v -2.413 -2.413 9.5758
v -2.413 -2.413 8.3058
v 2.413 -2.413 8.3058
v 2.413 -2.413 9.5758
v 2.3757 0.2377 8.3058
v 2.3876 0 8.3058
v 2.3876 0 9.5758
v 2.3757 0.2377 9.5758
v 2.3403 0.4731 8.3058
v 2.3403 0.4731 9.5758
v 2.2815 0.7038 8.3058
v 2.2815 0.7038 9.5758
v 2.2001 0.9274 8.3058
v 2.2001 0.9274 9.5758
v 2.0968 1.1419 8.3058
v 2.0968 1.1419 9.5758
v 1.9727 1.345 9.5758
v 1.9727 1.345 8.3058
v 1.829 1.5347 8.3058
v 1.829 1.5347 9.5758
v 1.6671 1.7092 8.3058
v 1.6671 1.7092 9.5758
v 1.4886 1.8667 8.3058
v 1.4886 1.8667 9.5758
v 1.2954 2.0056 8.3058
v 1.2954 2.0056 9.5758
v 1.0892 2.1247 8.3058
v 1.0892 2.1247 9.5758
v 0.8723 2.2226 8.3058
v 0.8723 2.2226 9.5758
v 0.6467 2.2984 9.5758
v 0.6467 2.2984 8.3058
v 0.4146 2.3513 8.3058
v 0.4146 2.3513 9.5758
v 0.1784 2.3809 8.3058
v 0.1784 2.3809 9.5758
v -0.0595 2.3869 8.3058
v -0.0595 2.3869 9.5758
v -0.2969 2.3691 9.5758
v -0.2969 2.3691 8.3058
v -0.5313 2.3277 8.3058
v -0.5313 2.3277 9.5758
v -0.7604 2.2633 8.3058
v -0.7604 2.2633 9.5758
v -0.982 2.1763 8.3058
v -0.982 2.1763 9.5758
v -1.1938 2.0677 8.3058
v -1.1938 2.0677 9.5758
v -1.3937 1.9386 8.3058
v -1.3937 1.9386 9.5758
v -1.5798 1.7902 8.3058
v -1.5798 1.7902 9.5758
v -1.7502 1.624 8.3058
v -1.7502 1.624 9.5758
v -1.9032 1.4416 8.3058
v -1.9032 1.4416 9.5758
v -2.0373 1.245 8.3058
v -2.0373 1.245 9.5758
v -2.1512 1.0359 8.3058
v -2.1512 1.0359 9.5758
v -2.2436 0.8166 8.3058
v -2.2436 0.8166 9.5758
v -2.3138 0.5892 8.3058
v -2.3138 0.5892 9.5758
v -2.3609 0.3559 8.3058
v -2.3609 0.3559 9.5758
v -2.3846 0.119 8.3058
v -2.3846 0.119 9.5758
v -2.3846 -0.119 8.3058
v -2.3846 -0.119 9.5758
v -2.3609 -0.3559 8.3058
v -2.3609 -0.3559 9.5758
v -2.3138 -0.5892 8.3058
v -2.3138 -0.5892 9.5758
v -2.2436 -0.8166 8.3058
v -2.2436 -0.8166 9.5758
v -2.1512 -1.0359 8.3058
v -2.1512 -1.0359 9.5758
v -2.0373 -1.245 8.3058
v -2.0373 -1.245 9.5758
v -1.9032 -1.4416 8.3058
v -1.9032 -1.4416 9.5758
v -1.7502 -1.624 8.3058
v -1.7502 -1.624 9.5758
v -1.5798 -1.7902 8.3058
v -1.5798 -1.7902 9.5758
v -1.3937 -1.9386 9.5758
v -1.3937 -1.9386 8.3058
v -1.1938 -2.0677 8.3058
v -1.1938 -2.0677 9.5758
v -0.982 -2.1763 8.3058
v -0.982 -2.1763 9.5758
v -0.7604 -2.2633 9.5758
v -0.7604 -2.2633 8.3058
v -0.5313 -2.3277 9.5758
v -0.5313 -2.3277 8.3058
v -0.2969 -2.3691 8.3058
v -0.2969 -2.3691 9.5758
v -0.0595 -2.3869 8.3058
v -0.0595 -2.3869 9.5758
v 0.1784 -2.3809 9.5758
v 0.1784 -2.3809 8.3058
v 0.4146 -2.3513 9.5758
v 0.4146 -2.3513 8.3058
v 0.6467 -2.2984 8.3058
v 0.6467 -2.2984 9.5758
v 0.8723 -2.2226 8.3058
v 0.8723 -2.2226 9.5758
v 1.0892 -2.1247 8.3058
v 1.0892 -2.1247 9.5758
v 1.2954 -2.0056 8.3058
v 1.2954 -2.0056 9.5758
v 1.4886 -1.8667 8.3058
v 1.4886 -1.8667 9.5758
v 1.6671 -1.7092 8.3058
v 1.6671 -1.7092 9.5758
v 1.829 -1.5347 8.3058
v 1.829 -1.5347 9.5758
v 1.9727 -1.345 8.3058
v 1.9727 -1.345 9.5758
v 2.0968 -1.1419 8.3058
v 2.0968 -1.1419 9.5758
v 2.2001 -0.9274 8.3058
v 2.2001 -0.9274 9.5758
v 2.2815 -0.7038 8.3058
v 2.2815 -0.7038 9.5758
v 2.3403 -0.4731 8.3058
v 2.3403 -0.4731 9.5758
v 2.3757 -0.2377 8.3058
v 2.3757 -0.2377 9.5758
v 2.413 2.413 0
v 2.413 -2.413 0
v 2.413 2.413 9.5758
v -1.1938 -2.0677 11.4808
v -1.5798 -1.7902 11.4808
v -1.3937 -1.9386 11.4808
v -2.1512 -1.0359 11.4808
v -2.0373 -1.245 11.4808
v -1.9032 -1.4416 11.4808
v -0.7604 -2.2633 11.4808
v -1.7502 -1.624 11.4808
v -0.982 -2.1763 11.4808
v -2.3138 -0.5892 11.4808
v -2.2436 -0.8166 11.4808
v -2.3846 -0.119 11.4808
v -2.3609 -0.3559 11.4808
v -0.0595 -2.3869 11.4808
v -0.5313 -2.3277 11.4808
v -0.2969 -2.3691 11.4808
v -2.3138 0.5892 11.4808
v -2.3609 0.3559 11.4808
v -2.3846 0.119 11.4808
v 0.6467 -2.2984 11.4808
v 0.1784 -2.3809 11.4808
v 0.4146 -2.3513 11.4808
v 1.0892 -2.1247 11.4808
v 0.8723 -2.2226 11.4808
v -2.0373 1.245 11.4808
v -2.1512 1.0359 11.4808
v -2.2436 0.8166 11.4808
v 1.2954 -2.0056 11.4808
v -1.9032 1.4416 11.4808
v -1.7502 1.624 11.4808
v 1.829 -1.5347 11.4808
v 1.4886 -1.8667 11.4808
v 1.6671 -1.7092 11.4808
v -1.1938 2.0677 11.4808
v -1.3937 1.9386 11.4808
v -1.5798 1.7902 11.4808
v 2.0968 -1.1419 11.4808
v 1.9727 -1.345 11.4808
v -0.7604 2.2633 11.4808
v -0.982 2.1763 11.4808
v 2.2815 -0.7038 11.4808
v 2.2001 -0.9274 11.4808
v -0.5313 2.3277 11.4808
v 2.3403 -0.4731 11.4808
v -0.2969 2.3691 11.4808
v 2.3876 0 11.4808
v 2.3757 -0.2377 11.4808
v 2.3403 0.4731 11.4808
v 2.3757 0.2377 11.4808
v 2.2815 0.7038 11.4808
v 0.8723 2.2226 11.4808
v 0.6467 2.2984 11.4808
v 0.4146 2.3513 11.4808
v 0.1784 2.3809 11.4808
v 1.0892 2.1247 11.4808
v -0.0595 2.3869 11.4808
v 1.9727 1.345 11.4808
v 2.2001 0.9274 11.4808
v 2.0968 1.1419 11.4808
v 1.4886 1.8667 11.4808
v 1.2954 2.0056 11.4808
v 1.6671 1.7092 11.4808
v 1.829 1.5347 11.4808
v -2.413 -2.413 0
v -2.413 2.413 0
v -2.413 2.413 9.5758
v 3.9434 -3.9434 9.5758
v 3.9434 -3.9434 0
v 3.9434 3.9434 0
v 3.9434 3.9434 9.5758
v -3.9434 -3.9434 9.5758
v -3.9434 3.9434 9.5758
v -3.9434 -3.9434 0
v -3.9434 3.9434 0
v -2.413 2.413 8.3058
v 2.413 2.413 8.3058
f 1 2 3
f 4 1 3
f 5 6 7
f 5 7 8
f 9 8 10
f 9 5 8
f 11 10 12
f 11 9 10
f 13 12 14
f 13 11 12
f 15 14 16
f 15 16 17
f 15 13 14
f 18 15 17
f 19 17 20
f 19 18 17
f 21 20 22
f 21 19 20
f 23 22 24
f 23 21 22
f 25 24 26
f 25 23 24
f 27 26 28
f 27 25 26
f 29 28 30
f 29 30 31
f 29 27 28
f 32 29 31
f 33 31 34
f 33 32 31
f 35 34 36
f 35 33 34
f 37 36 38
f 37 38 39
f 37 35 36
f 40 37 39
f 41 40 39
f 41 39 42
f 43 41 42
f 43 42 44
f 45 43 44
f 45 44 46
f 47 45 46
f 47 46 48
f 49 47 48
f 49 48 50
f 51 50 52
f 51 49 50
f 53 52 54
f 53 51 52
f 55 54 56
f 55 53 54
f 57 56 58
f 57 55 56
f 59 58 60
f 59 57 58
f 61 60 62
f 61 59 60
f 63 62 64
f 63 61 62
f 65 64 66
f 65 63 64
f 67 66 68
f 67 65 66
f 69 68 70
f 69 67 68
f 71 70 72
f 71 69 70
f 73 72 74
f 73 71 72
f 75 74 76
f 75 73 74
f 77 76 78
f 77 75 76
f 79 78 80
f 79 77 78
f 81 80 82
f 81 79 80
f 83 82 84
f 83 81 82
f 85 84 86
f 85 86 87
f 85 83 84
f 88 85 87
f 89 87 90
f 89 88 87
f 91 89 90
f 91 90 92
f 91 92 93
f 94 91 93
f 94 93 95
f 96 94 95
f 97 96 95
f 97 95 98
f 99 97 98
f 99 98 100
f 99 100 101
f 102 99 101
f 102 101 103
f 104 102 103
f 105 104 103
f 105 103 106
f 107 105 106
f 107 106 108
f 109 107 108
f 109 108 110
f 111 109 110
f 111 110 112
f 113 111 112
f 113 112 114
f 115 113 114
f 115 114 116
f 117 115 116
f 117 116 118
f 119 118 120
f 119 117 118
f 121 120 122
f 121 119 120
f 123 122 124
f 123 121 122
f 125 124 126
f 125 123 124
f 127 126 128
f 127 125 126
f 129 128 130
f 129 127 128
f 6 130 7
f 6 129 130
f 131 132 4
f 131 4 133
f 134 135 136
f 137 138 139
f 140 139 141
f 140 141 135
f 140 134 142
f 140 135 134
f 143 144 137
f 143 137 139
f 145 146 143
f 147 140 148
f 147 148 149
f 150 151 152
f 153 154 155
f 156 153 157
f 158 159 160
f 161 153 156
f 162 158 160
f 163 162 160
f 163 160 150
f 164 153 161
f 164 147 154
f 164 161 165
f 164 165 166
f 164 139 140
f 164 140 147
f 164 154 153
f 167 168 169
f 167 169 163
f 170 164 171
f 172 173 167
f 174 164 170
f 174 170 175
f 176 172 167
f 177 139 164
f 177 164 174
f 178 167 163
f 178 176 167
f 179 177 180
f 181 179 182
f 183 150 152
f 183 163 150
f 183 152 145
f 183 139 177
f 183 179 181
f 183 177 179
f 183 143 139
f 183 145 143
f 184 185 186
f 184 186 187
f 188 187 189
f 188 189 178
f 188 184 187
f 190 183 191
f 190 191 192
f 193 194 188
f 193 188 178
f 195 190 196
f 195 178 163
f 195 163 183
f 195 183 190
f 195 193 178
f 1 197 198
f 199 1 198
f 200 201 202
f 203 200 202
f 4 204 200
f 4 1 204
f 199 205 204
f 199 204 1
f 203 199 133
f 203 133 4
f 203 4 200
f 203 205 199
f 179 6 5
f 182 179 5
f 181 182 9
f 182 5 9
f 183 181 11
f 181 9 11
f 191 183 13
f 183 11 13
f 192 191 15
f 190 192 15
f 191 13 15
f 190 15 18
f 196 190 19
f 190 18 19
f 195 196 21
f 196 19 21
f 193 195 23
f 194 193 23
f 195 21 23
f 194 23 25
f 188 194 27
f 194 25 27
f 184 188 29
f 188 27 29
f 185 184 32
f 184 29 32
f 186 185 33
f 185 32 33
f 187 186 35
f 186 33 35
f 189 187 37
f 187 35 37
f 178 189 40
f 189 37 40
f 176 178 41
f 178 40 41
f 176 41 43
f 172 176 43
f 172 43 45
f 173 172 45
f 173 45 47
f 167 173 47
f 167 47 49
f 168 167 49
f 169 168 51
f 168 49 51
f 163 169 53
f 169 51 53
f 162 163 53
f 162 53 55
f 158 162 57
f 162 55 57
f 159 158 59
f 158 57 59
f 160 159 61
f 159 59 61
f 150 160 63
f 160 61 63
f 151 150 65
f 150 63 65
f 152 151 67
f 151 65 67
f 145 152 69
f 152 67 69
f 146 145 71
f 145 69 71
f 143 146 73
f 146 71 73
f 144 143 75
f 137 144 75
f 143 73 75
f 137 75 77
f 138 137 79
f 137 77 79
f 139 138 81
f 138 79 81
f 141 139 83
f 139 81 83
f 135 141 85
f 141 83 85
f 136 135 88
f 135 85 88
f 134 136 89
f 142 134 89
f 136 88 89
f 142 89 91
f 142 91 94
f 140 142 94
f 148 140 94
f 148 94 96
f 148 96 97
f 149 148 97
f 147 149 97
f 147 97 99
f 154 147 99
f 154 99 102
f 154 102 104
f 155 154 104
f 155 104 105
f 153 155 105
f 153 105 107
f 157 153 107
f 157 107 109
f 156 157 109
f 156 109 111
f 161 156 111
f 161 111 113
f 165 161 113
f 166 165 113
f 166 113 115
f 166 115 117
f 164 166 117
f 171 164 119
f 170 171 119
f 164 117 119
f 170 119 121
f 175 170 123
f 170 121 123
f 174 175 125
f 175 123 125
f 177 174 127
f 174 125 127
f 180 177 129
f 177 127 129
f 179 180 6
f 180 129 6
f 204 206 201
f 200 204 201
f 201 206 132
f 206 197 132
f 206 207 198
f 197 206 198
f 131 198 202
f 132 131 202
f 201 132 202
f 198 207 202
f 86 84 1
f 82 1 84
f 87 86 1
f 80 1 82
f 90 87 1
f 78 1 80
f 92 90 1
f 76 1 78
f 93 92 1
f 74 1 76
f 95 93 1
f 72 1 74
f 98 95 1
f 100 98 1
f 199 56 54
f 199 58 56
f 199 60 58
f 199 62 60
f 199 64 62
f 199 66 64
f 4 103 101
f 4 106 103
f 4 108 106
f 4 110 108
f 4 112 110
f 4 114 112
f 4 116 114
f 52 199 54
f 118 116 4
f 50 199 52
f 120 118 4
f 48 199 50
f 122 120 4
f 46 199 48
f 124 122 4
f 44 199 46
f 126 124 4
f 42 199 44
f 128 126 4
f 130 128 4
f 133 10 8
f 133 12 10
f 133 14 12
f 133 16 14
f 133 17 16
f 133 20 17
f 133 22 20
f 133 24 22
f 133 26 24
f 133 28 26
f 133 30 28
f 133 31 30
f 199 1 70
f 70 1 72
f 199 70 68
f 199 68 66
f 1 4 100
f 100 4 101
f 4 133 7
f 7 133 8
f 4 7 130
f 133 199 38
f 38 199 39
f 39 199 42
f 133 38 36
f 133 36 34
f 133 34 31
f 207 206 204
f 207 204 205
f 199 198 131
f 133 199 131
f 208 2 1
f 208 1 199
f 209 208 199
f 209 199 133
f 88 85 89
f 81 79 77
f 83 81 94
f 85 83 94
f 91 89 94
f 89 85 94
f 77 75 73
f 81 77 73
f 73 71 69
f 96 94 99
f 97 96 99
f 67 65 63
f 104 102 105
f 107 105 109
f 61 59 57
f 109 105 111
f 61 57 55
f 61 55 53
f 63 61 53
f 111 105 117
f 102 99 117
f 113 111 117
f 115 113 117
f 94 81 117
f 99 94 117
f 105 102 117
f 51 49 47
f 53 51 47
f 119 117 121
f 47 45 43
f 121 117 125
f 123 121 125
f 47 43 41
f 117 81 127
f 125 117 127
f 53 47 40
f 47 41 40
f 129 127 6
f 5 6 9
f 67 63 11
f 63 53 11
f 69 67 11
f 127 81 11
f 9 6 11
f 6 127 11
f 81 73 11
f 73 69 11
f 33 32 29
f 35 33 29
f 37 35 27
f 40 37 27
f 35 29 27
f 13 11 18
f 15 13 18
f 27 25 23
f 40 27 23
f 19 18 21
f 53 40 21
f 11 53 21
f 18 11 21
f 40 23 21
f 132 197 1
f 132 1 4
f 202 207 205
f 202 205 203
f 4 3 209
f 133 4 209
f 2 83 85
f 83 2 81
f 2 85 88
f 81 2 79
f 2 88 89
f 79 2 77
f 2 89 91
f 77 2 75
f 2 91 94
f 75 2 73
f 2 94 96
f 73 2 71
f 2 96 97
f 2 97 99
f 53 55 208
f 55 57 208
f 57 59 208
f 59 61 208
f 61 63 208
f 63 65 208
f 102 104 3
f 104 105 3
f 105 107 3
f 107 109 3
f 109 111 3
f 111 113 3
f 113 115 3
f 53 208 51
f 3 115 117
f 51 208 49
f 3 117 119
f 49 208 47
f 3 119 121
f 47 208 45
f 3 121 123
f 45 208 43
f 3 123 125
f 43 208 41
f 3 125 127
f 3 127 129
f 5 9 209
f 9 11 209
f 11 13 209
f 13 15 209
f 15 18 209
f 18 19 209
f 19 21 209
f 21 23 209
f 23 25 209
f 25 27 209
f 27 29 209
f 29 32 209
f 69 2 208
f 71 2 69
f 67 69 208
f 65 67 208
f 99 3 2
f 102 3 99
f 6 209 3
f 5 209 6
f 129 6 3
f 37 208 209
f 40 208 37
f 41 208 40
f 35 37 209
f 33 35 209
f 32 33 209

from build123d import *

# Parameters (mm, degrees)
F0_W     = 7.8867
F0_H     = 7.8867
F0_W_2   = 4.826
F0_H_2   = 4.826
F1_DEPTH = 9.5758
F2_START = 8.3058
F0_R     = 2.3876
F2_DEPTH = 1.27
F3_START = 8.3058
F3_DEPTH = 3.175


with BuildPart() as f1:
    # F0 (on Top) → F1 (new body)
    with BuildSketch(Plane.XY):
        Rectangle(F0_W, F0_H)
        Rectangle(F0_W_2, F0_H_2, mode=Mode.SUBTRACT)
    extrude(amount=F1_DEPTH)


with BuildPart() as f2:
    # F0 (on Top) → F2 (new body)
    with BuildSketch(Plane.XY.offset(F2_START)):
        Rectangle(F0_W_2, F0_H_2)
        Circle(F0_R, mode=Mode.SUBTRACT)
    extrude(amount=F2_DEPTH)


with BuildPart() as f3:
    # F0 (on Top) → F3 (new body)
    with BuildSketch(Plane.XY.offset(F3_START)):
        Circle(F0_R)
    extrude(amount=F3_DEPTH)


solid = Compound([f1.part, f2.part, f3.part])
